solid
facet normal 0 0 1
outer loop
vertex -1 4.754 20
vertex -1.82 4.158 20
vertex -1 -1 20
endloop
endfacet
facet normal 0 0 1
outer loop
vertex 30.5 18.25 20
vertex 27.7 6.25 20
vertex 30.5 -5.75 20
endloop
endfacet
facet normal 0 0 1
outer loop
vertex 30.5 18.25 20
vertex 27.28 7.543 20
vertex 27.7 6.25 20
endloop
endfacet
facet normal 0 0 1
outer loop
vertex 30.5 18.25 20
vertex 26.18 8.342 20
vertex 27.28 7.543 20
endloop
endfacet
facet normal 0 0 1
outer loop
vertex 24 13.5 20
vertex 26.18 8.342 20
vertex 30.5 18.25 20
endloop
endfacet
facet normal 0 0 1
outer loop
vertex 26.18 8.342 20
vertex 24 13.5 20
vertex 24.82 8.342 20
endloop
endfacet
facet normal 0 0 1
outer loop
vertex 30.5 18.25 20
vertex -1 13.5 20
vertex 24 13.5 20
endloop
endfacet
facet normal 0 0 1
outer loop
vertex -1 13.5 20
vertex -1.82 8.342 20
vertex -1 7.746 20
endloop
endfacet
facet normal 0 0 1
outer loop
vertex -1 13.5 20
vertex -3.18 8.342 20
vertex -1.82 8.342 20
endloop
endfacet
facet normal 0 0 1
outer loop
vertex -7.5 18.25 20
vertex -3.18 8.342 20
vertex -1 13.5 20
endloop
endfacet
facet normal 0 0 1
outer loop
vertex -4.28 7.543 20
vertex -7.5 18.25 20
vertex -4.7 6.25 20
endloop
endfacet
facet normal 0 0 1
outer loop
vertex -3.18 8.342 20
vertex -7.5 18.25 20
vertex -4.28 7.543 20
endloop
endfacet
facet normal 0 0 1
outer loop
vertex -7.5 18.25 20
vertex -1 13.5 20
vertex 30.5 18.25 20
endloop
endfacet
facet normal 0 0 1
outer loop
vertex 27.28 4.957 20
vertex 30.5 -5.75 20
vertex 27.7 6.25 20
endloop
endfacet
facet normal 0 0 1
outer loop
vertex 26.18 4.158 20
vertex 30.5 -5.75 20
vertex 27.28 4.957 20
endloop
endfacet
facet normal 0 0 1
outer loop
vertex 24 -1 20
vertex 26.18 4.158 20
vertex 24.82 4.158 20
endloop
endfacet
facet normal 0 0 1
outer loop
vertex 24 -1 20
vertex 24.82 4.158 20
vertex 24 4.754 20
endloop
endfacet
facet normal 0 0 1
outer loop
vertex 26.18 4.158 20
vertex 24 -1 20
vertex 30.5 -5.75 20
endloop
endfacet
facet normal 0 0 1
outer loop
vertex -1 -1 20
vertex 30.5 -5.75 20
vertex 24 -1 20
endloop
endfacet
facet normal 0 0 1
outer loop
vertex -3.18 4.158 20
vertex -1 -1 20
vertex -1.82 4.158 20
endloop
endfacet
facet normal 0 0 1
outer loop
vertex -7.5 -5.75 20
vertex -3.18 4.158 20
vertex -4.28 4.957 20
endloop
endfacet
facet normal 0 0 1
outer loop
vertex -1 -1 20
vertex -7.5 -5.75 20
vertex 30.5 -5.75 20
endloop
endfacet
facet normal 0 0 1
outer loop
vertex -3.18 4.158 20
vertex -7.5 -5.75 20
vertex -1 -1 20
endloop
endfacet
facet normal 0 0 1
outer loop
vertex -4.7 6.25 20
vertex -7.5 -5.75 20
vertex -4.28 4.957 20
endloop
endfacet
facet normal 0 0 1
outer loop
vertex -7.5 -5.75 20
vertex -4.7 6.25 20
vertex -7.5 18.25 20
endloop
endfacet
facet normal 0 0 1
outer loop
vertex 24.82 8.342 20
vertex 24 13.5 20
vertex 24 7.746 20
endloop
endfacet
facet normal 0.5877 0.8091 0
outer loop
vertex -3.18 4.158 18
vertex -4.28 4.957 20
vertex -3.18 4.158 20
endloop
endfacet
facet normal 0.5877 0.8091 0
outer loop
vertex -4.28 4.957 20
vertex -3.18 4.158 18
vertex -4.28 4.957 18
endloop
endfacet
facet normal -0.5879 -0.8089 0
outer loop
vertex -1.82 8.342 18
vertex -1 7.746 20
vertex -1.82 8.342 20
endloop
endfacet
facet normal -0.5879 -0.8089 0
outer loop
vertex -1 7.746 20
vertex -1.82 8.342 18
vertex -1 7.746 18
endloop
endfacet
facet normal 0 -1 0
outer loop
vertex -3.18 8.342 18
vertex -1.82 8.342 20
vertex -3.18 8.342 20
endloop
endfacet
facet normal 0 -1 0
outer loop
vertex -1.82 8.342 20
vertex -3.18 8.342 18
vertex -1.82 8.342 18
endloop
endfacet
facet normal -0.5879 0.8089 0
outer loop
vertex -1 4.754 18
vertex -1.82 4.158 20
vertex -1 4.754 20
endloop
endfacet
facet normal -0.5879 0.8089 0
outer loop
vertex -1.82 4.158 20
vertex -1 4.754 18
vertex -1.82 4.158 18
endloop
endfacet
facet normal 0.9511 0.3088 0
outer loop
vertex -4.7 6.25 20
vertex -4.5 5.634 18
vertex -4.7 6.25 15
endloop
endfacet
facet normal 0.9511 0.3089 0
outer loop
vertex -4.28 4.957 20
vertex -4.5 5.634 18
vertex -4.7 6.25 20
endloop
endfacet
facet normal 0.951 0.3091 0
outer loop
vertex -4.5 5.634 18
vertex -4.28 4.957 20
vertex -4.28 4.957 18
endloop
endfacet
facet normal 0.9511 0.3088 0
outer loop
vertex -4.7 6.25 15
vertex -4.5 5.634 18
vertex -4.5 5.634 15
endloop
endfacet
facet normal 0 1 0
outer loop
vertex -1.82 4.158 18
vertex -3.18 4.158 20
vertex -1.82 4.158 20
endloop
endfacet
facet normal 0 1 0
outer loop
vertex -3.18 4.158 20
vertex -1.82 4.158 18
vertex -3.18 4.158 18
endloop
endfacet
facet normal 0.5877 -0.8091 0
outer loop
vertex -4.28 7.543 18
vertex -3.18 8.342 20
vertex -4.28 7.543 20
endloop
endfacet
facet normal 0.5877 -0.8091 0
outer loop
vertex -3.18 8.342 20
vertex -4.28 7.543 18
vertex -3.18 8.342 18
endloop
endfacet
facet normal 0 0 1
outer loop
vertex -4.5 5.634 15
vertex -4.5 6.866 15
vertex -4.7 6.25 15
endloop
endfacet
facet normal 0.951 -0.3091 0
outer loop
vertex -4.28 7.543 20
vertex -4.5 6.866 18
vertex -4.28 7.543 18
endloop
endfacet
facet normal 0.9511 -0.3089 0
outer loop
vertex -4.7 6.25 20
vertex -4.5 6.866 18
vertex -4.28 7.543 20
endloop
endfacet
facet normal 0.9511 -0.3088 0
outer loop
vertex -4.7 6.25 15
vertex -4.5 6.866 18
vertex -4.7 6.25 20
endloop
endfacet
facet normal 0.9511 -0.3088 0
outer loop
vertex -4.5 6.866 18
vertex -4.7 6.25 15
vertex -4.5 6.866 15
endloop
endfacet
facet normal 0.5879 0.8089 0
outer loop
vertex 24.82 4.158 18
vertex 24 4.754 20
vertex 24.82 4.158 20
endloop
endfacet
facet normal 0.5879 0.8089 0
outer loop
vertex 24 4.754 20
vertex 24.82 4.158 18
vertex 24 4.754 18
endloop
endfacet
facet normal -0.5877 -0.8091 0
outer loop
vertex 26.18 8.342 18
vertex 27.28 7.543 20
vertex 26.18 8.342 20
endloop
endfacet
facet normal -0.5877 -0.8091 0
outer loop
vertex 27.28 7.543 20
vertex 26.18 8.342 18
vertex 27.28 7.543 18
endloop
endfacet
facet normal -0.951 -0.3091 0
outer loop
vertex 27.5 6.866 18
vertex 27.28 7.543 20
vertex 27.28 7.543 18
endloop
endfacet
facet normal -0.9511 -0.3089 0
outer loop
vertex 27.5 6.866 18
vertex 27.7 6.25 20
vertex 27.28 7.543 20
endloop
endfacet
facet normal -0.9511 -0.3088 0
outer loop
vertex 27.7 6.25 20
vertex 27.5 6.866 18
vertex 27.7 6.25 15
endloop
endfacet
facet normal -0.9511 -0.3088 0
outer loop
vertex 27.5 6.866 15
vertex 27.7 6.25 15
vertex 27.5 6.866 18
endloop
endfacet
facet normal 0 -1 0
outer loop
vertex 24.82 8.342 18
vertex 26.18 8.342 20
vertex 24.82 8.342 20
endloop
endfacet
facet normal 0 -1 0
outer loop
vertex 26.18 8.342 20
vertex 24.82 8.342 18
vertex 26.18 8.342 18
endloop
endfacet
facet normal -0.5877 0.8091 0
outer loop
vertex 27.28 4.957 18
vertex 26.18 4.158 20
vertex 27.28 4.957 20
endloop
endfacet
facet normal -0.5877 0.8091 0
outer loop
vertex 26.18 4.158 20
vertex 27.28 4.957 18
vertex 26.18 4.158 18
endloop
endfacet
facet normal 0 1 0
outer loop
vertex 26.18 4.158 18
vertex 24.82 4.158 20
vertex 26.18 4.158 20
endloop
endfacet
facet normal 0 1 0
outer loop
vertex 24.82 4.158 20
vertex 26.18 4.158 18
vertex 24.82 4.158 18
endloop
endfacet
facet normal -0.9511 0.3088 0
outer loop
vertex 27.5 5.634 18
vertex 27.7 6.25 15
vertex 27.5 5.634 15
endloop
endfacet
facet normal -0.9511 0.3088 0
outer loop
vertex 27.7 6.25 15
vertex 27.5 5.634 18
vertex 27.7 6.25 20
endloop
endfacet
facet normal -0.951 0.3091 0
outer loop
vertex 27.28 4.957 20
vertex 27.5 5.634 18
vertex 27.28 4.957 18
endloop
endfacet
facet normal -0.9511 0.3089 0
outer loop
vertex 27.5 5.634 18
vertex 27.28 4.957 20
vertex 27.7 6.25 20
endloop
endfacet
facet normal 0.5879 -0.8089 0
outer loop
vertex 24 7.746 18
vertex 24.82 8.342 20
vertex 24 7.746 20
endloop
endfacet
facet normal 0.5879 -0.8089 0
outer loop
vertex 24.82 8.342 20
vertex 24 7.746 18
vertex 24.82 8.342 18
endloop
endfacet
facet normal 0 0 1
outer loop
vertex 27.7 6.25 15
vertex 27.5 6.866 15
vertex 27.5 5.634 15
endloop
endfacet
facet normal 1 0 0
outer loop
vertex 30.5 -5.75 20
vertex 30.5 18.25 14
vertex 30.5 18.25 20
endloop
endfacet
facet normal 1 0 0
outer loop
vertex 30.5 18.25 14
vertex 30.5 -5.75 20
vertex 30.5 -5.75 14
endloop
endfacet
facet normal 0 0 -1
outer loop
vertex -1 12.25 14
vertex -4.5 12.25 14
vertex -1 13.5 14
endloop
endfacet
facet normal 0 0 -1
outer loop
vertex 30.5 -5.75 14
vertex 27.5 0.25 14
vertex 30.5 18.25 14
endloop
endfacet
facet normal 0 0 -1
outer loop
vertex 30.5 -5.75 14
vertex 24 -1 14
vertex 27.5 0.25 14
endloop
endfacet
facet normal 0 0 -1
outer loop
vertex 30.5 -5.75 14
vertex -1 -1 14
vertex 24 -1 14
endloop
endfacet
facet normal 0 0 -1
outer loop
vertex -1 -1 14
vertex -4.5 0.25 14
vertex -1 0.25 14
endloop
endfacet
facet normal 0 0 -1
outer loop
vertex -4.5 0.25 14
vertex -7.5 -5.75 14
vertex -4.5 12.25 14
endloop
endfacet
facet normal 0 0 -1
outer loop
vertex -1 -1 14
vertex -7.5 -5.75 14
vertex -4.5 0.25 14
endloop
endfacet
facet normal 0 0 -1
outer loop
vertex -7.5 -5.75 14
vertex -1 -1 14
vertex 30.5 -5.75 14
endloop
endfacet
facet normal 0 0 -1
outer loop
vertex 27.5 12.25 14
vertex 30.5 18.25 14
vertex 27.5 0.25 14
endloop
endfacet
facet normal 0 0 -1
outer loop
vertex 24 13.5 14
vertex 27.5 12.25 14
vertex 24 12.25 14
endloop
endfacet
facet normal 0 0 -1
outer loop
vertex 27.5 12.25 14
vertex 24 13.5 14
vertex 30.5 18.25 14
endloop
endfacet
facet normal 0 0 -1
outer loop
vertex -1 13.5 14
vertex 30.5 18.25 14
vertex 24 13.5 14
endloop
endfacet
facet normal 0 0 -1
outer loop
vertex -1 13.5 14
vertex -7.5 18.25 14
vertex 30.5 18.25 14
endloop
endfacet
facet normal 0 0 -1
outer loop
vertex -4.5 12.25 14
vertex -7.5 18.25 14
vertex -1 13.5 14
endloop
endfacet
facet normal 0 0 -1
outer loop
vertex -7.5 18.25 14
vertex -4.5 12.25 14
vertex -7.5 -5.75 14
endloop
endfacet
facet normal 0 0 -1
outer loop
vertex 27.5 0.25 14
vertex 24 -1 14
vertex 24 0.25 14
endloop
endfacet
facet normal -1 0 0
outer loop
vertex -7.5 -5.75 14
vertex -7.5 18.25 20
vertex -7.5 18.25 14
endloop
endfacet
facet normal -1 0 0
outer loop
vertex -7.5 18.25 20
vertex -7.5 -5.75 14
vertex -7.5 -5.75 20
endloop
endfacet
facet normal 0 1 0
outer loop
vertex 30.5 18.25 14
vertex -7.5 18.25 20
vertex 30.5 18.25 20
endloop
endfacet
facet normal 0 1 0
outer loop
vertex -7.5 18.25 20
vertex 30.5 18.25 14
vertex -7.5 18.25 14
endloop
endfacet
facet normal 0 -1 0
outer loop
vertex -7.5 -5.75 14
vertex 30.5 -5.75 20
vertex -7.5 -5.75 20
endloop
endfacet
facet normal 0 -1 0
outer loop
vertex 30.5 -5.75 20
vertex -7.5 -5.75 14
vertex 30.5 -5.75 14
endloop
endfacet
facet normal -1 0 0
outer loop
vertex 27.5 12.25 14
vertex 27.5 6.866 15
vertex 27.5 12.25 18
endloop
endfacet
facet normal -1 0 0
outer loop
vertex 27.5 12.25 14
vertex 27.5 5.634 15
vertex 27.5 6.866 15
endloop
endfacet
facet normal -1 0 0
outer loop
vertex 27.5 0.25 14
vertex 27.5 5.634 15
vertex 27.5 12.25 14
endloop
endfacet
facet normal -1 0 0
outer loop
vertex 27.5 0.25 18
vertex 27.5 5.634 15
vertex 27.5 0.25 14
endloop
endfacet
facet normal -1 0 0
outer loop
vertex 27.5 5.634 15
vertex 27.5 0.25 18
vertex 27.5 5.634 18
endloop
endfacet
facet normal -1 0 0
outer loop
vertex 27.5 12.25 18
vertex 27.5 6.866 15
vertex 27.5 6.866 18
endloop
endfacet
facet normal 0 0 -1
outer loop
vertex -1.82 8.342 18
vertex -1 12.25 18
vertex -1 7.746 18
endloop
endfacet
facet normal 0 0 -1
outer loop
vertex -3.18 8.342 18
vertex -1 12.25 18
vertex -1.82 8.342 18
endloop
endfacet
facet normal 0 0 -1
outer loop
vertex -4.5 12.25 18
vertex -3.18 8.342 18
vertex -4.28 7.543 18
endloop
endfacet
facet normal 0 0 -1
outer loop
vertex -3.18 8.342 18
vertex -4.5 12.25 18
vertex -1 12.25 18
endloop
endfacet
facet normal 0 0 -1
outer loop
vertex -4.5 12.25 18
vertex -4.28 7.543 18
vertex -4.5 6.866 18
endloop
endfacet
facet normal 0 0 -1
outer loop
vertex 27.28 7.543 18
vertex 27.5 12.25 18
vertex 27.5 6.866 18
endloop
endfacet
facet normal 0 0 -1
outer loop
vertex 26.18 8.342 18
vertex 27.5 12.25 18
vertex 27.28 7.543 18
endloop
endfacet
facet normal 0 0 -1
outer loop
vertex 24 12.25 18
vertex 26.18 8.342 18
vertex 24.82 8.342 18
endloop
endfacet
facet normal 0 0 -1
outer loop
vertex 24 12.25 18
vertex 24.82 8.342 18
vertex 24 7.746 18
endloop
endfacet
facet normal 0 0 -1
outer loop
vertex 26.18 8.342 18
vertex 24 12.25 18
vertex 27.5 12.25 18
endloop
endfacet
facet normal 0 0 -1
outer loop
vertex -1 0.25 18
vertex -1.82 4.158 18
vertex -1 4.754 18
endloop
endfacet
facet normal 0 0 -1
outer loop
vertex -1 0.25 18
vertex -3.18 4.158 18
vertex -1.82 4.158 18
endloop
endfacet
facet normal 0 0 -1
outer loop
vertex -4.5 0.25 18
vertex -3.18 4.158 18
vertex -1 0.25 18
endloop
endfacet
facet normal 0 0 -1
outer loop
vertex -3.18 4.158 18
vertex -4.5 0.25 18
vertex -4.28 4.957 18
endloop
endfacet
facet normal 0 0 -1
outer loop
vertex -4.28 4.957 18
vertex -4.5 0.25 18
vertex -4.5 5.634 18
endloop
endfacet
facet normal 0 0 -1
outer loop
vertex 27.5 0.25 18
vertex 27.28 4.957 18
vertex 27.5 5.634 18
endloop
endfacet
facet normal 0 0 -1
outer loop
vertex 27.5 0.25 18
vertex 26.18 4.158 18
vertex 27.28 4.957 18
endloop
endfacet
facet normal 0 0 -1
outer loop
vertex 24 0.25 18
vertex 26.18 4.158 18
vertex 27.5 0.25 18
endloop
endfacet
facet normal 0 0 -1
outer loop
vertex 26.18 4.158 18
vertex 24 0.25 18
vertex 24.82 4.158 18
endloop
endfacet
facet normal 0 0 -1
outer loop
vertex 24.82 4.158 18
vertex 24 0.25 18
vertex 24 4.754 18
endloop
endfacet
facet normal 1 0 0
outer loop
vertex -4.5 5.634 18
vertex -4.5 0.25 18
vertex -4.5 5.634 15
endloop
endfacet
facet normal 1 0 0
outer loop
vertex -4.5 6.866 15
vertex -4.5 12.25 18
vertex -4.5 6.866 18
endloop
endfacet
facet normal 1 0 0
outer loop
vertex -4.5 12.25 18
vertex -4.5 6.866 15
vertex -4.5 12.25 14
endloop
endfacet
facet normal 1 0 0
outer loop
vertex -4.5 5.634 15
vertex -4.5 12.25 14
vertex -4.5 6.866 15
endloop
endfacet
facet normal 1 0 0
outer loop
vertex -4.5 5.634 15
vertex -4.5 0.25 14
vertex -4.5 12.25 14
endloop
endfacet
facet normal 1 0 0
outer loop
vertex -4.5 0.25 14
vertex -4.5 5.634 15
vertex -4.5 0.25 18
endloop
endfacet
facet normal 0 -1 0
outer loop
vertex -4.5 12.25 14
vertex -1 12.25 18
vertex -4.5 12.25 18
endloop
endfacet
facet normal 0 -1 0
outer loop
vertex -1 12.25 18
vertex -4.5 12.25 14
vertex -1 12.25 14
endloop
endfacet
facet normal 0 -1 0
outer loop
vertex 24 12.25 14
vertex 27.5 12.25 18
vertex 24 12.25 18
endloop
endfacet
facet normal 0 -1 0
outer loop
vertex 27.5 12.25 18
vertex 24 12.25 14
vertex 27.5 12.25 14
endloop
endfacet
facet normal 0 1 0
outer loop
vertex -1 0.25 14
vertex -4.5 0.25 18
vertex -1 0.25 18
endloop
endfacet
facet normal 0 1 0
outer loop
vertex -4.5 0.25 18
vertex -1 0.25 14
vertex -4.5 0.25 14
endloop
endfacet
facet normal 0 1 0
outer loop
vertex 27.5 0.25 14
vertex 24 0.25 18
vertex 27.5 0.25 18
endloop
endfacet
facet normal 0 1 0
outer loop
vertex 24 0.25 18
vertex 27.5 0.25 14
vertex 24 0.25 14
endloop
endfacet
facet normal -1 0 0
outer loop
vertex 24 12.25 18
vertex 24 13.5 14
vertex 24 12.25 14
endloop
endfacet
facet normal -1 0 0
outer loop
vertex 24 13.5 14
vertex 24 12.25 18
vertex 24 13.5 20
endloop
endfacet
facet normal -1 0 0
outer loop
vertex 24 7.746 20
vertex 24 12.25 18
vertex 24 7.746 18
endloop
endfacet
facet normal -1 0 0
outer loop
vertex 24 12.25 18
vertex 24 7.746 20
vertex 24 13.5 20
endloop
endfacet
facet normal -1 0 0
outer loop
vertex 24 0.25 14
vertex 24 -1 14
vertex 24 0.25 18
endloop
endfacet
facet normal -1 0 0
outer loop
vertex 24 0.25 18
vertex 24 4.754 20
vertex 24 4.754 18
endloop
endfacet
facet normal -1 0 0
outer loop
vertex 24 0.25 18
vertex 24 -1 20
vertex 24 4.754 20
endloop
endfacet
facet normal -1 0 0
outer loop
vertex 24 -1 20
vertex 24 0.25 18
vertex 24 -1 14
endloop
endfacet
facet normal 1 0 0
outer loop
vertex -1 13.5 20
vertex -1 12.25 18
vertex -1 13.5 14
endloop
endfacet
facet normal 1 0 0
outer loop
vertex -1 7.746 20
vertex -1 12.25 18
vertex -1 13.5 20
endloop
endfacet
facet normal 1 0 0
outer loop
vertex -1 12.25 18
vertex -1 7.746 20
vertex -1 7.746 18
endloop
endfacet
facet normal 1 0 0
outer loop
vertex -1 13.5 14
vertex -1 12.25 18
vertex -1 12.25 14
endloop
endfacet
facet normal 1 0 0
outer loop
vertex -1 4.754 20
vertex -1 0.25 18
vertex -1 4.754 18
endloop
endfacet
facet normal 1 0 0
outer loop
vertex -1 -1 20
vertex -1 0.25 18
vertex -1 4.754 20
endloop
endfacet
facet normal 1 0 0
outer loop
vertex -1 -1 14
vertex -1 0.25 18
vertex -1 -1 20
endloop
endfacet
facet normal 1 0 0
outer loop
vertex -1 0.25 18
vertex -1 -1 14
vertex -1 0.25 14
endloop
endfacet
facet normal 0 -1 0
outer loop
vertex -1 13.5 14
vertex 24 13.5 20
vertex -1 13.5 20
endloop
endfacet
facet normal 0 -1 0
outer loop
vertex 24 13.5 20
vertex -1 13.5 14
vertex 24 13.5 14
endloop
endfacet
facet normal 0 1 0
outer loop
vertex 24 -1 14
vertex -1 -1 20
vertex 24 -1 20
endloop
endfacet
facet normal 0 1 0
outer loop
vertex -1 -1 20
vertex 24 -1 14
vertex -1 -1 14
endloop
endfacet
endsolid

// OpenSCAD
// file: libraries/ng_motor.scad
// Courtesy of http://www.thingiverse.com/thing:29734/

// base length, width, height
ng_motor_bl = 23;
ng_motor_bw = 12.5;
ng_motor_bh = 22;
ng_motor_bdim = [ng_motor_bl, ng_motor_bw, ng_motor_bh];
// mount length, width, height, x offset, y offset, bottom
ng_motor_ml = 32;
ng_motor_mw = 12;
ng_motor_mh = 2;
ng_motor_mdim = [ng_motor_ml, ng_motor_mw, ng_motor_mh];
ng_motor_mx = (ng_motor_bl - ng_motor_ml) / 2;
ng_motor_my = (ng_motor_bw - ng_motor_mw) / 2;
ng_motor_mbot = ng_motor_bh / 2 + 4;
ng_motor_mpos = [ng_motor_mx, ng_motor_my, ng_motor_mbot];
// shaft base x offset, bottom, radius, and height
ng_motor_sbr = 6;
ng_motor_sbh = 4.625;
ng_motor_sbx = ng_motor_bl / 2 + 5.5;
ng_motor_sbbot = ng_motor_bh;
ng_motor_sby = ng_motor_bw / 2;
ng_motor_sbpos = [ng_motor_sbx, ng_motor_sby, ng_motor_sbbot];
// Ignoring the small, insignificant circle
// Drive gear x offset, y offset, bottom, length, width, height
ng_motor_dgl = 5;
ng_motor_dgw = 5.6;
ng_motor_dgh = 4.625;
ng_motor_dgdim = [ng_motor_dgl, ng_motor_dgw, ng_motor_dgh];
ng_motor_dgx = ng_motor_bl / 2 - ng_motor_dgl / 2 - 1;
ng_motor_dgy = ng_motor_bw / 2 - ng_motor_dgw / 2;
ng_motor_dgbot = ng_motor_bh;
ng_motor_dgpos = [ng_motor_dgx, ng_motor_dgy, ng_motor_dgbot];
// Drive axle radius, height, x offset, y offset, bottom
ng_motor_dar = 2.35;
ng_motor_dah = 2.65;
ng_motor_dax = ng_motor_bl / 2 + 5.5;
ng_motor_day = ng_motor_bw / 2;
ng_motor_dabot = ng_motor_sbbot + ng_motor_sbh;
ng_motor_dapos = [ng_motor_dax, ng_motor_day, ng_motor_dabot];
// Cutout x offset, y offset, bottom, angle, length, width, height
ng_motor_cl = 8;
ng_motor_cw = ng_motor_bw + 0.5;
ng_motor_ch = 4;
ng_motor_cdim = [ng_motor_cl, ng_motor_cw, ng_motor_ch];
ng_motor_cx = ng_motor_bl;
ng_motor_cy = ng_motor_bw / 2;
ng_motor_cbot = 0;
ng_motor_cpos = [ng_motor_cx, ng_motor_cy, ng_motor_cbot];
ng_motor_cangle = [0, -30, 0];
// Mounting holes x offsets, y offset, bottom, radius, height
ng_motor_mhx = [ng_motor_bl / 2 - 14, ng_motor_bl / 2 + 14];
ng_motor_mhy = ng_motor_bw / 2;
ng_motor_mhbot = ng_motor_mbot;
ng_motor_mhr = 2.2;
ng_motor_mhh = ng_motor_mh;
// Color
ng_motor_body_color = "steelblue";
ng_motor_axle_color = "white";
// Overall stats
ng_motor_w = ng_motor_mw;
ng_motor_h = ng_motor_bh + ng_motor_sbh + ng_motor_dah;

module ng_motor($fn=$fn) {
  difference() {
    union() {
      // Main motor body
      color(ng_motor_body_color)
	cube(ng_motor_bdim);
      // Mount
      color(ng_motor_body_color)
	translate(ng_motor_mpos)
	cube(ng_motor_mdim);
      // Larger, lower shaft base
      color(ng_motor_body_color)
	translate(ng_motor_sbpos)
	cylinder(r=ng_motor_sbr, h=ng_motor_sbh);
      // Small insignificant circle
      *color(ng_motor_body_color)
      	translate([-.5,0,2.75])
	cylinder(r=1, h=25.75, center=true);
      // Drive gear beside the shaft base
      color(ng_motor_body_color)
	translate(ng_motor_dgpos)
	cube(ng_motor_dgdim);
      // Drive axle
      color(ng_motor_axle_color)
	translate(ng_motor_dapos)
	cylinder(r=ng_motor_dar, h=ng_motor_dah);
    }
    // Angled part on the bottom of the servo
    translate(ng_motor_cpos)
      rotate(ng_motor_cangle)
      cube(ng_motor_cdim, center=true);
    // Mounting holes
    for (hole = ng_motor_mhx) {
      translate([hole, ng_motor_mhy, ng_motor_mhbot])
	cylinder(r=ng_motor_mhr, h=ng_motor_mhh);
    }
  }
}
// main file
include <libraries/ng_motor.scad>;

function expand(val, n=3) = val * (n == 2 ? [1, 1] : n == 3 ? [1, 1, 1] : echo("expand not defined for n=", n));

$fn = 10;

// Rack and pinion platform position and dimension
rap_pdel = [-3, -6, -1];
rap_ppos = ng_motor_mpos + rap_pdel;
rap_pdim = ng_motor_mdim + -2 * rap_pdel + [0, 0, 2];
// Rack and pinion mounting hole position, radius, height
rap_mhx = ng_motor_mhx;
rap_mhy = ng_motor_mhy;
rap_mhbot = ng_motor_mhbot;
rap_mhr = ng_motor_mhr;
rap_mhh = rap_pdim.z + (rap_ppos.z - rap_mhbot);
// Rack and pinion motor (and mount) cutout position and dimension
rap_mcdel = [0, 0, -1];
rap_mcpos = ng_motor_mpos + rap_mcdel;
rap_mcdim = ng_motor_mdim + -2 * rap_mcdel;
// Rack and pinion motor tolerance cutout tolerance, x offset, y offset, bottom,
// length, width, and height
rap_mttol = 1;
rap_mtx = -rap_mttol;
rap_mty = -rap_mttol;
rap_mtbot = rap_ppos.z;
rap_mtpos = [rap_mtx, rap_mty, rap_mtbot];
rap_mtl = ng_motor_bl + 2 * rap_mttol;
rap_mtw = ng_motor_bw + 2 * rap_mttol;
rap_mth = rap_pdim.z;
rap_mtdim = [rap_mtl, rap_mtw, rap_mth];
// Rack and pinion side wall
rap_swl = rap_pdim.x;
rap_sww = 4;
rap_swh = 10;
rap_swdim = [rap_swl, rap_sww, rap_swh];
rap_swx = rap_ppos.x;
rap_swy = expand(rap_ppos[1], n=2) + [0, rap_pdim[1] - rap_sww];
rap_swbot = rap_ppos.z + rap_pdim.z;

module rack_and_pinion_mount() {
	difference() {
		union() {
			// Main platform
			color("red") translate(rap_ppos)
				cube(rap_pdim);
			// Side walls
			*for (y = rap_swy) {
				color("green") translate([rap_swx, y, rap_swbot])
					cube(rap_swdim);
			}
		}
		// Motor and mount cutout
		translate(rap_mcpos)
			cube(rap_mcdim);
		// Motor tolerance cutout
		translate(rap_mtpos)
			cube(rap_mtdim);
		// Mounting holes
		for (hole = rap_mhx) {
			translate([hole, rap_mhy, rap_mhbot])
				cylinder(r=rap_mhr, h=rap_mhh);
		}
	}
}

module rack_and_pinion_gear() {
	cube();
}

rack_and_pinion_mount();
%ng_motor();
